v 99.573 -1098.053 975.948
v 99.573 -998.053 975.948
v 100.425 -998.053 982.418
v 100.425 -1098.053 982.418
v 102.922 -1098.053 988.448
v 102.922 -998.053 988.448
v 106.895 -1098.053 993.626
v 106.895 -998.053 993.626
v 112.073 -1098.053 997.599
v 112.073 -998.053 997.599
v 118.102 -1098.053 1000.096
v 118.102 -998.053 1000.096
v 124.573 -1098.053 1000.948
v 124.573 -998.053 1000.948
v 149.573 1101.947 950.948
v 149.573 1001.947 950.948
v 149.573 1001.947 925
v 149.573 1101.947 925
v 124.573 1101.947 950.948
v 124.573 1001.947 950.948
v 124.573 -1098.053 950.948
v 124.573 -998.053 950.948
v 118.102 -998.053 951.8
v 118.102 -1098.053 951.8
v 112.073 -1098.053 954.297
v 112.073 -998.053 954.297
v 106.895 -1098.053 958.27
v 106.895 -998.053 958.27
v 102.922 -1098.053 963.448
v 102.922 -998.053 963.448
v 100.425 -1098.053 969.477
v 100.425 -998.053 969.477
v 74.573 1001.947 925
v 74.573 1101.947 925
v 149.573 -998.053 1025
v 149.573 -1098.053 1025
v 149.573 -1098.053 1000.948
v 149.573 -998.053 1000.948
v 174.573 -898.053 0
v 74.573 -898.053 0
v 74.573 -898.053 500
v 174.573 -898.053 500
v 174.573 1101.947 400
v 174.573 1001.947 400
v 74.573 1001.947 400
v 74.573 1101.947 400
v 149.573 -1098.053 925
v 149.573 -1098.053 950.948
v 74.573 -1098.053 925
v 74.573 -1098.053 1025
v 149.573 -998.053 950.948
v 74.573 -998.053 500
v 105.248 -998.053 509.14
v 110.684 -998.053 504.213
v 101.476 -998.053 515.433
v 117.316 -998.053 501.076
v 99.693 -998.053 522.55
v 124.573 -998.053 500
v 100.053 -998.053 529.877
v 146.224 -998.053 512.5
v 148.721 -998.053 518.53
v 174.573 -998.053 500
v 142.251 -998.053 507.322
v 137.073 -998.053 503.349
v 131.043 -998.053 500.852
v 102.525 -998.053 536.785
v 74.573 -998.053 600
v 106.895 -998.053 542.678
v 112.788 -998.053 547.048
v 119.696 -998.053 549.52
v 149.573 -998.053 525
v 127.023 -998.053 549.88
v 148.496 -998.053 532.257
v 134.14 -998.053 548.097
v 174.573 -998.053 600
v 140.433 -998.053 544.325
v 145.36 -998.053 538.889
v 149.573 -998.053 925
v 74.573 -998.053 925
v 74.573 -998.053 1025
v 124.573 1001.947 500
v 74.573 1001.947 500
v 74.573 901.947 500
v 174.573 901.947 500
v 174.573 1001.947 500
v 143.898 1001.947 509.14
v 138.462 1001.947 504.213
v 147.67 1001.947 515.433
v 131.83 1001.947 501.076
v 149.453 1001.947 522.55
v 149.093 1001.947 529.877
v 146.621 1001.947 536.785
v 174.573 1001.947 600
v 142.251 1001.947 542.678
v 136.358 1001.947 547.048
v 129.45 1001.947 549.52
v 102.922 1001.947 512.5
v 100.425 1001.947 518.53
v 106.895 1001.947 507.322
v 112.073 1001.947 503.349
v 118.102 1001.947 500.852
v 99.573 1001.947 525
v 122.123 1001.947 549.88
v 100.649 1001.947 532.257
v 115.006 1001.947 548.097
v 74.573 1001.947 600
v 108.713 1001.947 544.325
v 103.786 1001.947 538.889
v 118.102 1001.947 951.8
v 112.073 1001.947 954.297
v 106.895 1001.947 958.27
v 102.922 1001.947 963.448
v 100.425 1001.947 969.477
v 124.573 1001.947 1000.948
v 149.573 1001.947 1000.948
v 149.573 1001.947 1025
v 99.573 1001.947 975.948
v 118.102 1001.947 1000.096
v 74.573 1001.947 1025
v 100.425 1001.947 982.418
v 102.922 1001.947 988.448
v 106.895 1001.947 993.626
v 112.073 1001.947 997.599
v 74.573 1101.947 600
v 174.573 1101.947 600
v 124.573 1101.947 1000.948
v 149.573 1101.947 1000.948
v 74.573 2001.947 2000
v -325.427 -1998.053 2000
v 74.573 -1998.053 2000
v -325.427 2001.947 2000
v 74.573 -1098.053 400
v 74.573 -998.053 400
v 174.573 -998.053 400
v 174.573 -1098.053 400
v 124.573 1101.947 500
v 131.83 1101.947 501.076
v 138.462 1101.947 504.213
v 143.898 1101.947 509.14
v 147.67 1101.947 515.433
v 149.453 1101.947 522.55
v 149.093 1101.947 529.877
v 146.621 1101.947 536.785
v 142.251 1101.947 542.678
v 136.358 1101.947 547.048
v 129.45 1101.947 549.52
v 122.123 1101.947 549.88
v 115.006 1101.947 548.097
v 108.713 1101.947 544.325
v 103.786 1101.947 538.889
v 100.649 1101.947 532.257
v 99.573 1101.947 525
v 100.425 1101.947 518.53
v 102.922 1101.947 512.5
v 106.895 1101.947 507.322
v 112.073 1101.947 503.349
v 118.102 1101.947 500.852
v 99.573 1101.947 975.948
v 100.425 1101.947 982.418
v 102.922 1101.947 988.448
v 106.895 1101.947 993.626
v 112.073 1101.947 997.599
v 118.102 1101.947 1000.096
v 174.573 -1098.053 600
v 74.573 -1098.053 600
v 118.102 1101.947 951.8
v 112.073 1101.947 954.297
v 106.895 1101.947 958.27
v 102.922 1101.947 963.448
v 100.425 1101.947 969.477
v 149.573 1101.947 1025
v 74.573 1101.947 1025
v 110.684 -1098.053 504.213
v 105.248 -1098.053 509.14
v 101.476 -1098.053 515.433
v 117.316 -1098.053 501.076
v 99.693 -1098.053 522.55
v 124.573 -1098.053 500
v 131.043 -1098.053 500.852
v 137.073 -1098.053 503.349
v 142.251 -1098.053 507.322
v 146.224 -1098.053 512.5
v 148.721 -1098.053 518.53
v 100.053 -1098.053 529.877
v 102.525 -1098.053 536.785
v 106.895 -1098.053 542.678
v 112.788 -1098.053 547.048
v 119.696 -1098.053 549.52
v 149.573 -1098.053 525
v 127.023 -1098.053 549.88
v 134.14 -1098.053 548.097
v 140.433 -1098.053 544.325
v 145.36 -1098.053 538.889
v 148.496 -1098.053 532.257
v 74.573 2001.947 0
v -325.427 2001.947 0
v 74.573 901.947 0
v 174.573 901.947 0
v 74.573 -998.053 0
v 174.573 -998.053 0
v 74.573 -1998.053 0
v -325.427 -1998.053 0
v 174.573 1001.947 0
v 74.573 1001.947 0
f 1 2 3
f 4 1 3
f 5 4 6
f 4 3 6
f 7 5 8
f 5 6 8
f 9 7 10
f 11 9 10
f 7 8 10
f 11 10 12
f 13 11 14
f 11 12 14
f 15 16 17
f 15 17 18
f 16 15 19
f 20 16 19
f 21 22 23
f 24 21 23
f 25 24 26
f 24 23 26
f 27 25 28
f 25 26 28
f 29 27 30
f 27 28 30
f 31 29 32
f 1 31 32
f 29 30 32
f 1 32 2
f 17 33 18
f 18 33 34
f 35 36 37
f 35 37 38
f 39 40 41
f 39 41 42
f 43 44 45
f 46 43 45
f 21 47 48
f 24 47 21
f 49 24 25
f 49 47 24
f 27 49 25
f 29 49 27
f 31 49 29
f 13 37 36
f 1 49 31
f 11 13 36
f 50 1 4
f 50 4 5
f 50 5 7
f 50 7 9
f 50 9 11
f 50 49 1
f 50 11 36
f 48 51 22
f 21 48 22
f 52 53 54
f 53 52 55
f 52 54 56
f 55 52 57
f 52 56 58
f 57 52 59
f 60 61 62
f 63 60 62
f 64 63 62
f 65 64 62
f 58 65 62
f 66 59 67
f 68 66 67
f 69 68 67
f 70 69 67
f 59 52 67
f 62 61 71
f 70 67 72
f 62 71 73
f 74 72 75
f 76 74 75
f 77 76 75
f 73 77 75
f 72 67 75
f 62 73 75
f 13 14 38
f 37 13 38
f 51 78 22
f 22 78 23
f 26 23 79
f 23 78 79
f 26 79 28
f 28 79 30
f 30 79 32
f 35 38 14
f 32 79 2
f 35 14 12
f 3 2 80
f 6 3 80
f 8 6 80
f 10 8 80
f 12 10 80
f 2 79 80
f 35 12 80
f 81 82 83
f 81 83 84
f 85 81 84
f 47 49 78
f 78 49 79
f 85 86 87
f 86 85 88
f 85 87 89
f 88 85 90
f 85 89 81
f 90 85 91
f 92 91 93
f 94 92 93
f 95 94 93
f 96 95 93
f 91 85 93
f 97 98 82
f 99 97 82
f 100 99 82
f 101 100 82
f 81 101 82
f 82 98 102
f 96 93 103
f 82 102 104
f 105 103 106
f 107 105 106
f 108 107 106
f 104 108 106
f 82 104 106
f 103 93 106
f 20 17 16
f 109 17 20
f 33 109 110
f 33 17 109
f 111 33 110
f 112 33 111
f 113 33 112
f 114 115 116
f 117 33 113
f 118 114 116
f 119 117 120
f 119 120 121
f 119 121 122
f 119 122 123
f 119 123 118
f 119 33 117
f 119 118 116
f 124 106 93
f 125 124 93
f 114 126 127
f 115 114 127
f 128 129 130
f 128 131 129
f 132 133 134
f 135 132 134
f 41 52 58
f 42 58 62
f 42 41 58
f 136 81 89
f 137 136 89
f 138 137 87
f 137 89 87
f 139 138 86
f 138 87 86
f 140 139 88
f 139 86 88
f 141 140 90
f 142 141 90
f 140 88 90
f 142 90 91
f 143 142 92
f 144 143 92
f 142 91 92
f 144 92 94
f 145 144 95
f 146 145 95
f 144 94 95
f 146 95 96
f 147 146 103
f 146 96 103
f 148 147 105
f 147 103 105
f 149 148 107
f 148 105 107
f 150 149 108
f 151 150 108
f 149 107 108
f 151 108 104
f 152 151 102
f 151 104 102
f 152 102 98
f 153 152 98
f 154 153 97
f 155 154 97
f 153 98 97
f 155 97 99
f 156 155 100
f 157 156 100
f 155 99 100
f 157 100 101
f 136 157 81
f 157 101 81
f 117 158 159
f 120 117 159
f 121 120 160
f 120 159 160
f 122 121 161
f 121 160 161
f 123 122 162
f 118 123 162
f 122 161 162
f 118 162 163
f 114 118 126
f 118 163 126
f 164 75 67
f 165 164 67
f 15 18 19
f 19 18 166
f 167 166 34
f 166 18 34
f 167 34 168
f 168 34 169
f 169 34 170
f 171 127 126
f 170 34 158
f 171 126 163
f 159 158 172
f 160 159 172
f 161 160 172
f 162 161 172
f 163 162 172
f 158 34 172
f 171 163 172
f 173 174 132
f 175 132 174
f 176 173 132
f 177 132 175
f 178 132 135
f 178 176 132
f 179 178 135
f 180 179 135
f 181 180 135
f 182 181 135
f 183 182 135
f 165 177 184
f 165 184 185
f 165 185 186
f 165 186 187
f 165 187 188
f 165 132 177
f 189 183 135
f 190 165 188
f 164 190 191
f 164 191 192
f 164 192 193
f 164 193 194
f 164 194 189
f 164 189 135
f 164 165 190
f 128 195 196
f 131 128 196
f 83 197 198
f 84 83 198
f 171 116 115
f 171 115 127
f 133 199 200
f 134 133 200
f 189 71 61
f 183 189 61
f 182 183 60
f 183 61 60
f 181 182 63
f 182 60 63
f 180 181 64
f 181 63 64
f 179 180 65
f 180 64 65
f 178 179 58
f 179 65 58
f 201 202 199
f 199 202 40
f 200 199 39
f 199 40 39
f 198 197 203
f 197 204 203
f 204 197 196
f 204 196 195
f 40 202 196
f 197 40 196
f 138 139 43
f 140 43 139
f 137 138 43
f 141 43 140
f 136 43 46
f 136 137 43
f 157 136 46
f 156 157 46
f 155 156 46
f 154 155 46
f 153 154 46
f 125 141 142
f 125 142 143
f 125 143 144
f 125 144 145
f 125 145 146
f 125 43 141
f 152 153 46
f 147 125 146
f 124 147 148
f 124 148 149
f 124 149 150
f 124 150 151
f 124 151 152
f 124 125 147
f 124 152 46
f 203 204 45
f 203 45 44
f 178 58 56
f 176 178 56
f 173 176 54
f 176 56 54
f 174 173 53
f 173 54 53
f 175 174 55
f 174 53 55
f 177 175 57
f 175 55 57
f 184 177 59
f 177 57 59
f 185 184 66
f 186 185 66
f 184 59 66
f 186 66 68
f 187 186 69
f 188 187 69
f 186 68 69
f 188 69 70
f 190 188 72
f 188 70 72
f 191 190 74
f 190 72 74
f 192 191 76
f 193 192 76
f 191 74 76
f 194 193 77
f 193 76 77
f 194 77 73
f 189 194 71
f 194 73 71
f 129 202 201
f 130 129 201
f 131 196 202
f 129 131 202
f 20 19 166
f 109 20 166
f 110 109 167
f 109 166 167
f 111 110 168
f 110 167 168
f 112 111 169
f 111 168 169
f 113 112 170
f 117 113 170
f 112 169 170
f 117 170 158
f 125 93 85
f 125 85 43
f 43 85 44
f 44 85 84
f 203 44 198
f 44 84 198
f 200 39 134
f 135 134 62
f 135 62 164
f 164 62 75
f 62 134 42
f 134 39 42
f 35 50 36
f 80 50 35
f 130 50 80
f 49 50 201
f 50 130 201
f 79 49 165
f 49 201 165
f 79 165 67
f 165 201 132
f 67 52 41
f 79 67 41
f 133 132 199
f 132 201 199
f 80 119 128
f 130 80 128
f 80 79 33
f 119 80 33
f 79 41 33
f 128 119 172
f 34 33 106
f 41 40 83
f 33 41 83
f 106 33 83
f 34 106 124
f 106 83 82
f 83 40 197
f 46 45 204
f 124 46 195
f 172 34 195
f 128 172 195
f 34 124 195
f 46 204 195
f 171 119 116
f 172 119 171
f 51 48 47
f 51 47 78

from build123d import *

# Parameters (mm, degrees)
F1_DEPTH  = 2000
F0_W      = 100
F0_H      = 100
F2_DEPTH  = 500
F5_DEPTH  = 100
F6_DEPTH  = 100
F7_W      = 100
F7_H      = 100
F8_DEPTH  = 75
F10_DEPTH = 2277


with BuildPart() as f1:
    # F0 (on Top) → F1 (new body)
    with BuildSketch(Plane.XY):
        Polygon((-325.4270623924, -1998.0526566505), (74.5729376076, -1998.0526566505), (74.5729376076, -998.0526566505), (74.5729376076, -898.0526566505), (74.5729376076, 901.9473433495), (74.5729376076, 1001.9473433495), (74.5729376076, 2001.9473433495), (-325.4270623924, 2001.9473433495), align=None)
    extrude(amount=F1_DEPTH)

    # F0 (on Top) → F2 (join)
    with BuildSketch(Plane.XY):
        with Locations((124.5729376076, -948.0526566505)):
            Rectangle(F0_W, F0_H)
        with Locations((124.5729376076, 951.9473433495)):
            Rectangle(F0_W, F0_H)
    extrude(amount=F2_DEPTH)

    # F4 (on face) → F5 (join)
    with BuildSketch(Plane(origin=(0, 1001.9473433495, 0), x_dir=(-1, 0, 0), z_dir=(0, 1, 0))):
        Polygon((-174.5729376076, 400), (-74.5729376076, 400), (-74.5729376076, 500), (-124.5729376076, 500), (-174.5729376076, 500), align=None)
        Polygon((-124.5729376076, 500), (-74.5729376076, 500), (-74.5729376076, 600), (-174.5729376076, 600), (-174.5729376076, 500), align=None)
        with BuildLine():
            ThreePointArc((-99.5729376076, 525), (-106.8952680779, 507.3223304703), (-124.5729376076, 500))
            ThreePointArc((-124.5729376076, 500), (-142.2506071373, 542.6776695297), (-99.5729376076, 525))
        make_face(mode=Mode.SUBTRACT)
    extrude(amount=F5_DEPTH)

    # F3 (on face) → F6 (join)
    with BuildSketch(Plane.XZ.offset(998.0526566505)):
        Polygon((74.5729376076, 600), (74.5729376076, 500), (124.5729376076, 500), (174.5729376076, 500), (174.5729376076, 600), align=None)
        with BuildLine():
            ThreePointArc((149.5729376076, 525), (142.2506071373, 507.3223304703), (124.5729376076, 500))
            ThreePointArc((124.5729376076, 500), (106.8952680779, 542.6776695297), (149.5729376076, 525))
        make_face(mode=Mode.SUBTRACT)
        Polygon((74.5729376076, 500), (74.5729376076, 400), (174.5729376076, 400), (174.5729376076, 500), (124.5729376076, 500), align=None)
    extrude(amount=F6_DEPTH)

    # F7 (on face) → F8 (join)
    with BuildSketch(Plane.YZ.offset(74.5729376076)):
        with Locations((-1048.0526566505, 975)):
            Rectangle(F7_W, F7_H)
        with Locations((1051.9473433495, 975)):
            Rectangle(F7_W, F7_H)
    extrude(amount=F8_DEPTH)

    # F9 (on face) → F10 (cut)
    with BuildSketch(Plane(origin=(0, 1101.9473433495, 0), x_dir=(-1, 0, 0), z_dir=(0, 1, 0))):
        with BuildLine():
            ThreePointArc((-124.5729376076, 950.9479165077), (-106.8952680779, 958.2702469781), (-99.5729376076, 975.9479165077))
            ThreePointArc((-99.5729376076, 975.9479165077), (-106.8952680779, 993.6255860374), (-124.5729376076, 1000.9479165077))
            ThreePointArc((-124.5729376076, 1000.9479165077), (-142.2506071373, 993.6255860374), (-149.5729376076, 975.9479165077))
            ThreePointArc((-149.5729376076, 975.9479165077), (-142.2506071373, 958.2702469781), (-124.5729376076, 950.9479165077))
        make_face()
        with BuildLine():
            ThreePointArc((-149.5729376076, 975.9479165077), (-142.2506071373, 993.6255860374), (-124.5729376076, 1000.9479165077))
            Line((-124.5729376076, 1000.9479165077), (-149.5729376076, 1000.9479165077))
            Line((-149.5729376076, 1000.9479165077), (-149.5729376076, 975.9479165077))
        make_face()
        with BuildLine():
            Line((-149.5729376076, 950.9479165077), (-124.5729376076, 950.9479165077))
            ThreePointArc((-124.5729376076, 950.9479165077), (-142.2506071373, 958.2702469781), (-149.5729376076, 975.9479165077))
            Line((-149.5729376076, 975.9479165077), (-149.5729376076, 950.9479165077))
        make_face()
    extrude(amount=-F10_DEPTH, mode=Mode.SUBTRACT)


solid = f1.part
